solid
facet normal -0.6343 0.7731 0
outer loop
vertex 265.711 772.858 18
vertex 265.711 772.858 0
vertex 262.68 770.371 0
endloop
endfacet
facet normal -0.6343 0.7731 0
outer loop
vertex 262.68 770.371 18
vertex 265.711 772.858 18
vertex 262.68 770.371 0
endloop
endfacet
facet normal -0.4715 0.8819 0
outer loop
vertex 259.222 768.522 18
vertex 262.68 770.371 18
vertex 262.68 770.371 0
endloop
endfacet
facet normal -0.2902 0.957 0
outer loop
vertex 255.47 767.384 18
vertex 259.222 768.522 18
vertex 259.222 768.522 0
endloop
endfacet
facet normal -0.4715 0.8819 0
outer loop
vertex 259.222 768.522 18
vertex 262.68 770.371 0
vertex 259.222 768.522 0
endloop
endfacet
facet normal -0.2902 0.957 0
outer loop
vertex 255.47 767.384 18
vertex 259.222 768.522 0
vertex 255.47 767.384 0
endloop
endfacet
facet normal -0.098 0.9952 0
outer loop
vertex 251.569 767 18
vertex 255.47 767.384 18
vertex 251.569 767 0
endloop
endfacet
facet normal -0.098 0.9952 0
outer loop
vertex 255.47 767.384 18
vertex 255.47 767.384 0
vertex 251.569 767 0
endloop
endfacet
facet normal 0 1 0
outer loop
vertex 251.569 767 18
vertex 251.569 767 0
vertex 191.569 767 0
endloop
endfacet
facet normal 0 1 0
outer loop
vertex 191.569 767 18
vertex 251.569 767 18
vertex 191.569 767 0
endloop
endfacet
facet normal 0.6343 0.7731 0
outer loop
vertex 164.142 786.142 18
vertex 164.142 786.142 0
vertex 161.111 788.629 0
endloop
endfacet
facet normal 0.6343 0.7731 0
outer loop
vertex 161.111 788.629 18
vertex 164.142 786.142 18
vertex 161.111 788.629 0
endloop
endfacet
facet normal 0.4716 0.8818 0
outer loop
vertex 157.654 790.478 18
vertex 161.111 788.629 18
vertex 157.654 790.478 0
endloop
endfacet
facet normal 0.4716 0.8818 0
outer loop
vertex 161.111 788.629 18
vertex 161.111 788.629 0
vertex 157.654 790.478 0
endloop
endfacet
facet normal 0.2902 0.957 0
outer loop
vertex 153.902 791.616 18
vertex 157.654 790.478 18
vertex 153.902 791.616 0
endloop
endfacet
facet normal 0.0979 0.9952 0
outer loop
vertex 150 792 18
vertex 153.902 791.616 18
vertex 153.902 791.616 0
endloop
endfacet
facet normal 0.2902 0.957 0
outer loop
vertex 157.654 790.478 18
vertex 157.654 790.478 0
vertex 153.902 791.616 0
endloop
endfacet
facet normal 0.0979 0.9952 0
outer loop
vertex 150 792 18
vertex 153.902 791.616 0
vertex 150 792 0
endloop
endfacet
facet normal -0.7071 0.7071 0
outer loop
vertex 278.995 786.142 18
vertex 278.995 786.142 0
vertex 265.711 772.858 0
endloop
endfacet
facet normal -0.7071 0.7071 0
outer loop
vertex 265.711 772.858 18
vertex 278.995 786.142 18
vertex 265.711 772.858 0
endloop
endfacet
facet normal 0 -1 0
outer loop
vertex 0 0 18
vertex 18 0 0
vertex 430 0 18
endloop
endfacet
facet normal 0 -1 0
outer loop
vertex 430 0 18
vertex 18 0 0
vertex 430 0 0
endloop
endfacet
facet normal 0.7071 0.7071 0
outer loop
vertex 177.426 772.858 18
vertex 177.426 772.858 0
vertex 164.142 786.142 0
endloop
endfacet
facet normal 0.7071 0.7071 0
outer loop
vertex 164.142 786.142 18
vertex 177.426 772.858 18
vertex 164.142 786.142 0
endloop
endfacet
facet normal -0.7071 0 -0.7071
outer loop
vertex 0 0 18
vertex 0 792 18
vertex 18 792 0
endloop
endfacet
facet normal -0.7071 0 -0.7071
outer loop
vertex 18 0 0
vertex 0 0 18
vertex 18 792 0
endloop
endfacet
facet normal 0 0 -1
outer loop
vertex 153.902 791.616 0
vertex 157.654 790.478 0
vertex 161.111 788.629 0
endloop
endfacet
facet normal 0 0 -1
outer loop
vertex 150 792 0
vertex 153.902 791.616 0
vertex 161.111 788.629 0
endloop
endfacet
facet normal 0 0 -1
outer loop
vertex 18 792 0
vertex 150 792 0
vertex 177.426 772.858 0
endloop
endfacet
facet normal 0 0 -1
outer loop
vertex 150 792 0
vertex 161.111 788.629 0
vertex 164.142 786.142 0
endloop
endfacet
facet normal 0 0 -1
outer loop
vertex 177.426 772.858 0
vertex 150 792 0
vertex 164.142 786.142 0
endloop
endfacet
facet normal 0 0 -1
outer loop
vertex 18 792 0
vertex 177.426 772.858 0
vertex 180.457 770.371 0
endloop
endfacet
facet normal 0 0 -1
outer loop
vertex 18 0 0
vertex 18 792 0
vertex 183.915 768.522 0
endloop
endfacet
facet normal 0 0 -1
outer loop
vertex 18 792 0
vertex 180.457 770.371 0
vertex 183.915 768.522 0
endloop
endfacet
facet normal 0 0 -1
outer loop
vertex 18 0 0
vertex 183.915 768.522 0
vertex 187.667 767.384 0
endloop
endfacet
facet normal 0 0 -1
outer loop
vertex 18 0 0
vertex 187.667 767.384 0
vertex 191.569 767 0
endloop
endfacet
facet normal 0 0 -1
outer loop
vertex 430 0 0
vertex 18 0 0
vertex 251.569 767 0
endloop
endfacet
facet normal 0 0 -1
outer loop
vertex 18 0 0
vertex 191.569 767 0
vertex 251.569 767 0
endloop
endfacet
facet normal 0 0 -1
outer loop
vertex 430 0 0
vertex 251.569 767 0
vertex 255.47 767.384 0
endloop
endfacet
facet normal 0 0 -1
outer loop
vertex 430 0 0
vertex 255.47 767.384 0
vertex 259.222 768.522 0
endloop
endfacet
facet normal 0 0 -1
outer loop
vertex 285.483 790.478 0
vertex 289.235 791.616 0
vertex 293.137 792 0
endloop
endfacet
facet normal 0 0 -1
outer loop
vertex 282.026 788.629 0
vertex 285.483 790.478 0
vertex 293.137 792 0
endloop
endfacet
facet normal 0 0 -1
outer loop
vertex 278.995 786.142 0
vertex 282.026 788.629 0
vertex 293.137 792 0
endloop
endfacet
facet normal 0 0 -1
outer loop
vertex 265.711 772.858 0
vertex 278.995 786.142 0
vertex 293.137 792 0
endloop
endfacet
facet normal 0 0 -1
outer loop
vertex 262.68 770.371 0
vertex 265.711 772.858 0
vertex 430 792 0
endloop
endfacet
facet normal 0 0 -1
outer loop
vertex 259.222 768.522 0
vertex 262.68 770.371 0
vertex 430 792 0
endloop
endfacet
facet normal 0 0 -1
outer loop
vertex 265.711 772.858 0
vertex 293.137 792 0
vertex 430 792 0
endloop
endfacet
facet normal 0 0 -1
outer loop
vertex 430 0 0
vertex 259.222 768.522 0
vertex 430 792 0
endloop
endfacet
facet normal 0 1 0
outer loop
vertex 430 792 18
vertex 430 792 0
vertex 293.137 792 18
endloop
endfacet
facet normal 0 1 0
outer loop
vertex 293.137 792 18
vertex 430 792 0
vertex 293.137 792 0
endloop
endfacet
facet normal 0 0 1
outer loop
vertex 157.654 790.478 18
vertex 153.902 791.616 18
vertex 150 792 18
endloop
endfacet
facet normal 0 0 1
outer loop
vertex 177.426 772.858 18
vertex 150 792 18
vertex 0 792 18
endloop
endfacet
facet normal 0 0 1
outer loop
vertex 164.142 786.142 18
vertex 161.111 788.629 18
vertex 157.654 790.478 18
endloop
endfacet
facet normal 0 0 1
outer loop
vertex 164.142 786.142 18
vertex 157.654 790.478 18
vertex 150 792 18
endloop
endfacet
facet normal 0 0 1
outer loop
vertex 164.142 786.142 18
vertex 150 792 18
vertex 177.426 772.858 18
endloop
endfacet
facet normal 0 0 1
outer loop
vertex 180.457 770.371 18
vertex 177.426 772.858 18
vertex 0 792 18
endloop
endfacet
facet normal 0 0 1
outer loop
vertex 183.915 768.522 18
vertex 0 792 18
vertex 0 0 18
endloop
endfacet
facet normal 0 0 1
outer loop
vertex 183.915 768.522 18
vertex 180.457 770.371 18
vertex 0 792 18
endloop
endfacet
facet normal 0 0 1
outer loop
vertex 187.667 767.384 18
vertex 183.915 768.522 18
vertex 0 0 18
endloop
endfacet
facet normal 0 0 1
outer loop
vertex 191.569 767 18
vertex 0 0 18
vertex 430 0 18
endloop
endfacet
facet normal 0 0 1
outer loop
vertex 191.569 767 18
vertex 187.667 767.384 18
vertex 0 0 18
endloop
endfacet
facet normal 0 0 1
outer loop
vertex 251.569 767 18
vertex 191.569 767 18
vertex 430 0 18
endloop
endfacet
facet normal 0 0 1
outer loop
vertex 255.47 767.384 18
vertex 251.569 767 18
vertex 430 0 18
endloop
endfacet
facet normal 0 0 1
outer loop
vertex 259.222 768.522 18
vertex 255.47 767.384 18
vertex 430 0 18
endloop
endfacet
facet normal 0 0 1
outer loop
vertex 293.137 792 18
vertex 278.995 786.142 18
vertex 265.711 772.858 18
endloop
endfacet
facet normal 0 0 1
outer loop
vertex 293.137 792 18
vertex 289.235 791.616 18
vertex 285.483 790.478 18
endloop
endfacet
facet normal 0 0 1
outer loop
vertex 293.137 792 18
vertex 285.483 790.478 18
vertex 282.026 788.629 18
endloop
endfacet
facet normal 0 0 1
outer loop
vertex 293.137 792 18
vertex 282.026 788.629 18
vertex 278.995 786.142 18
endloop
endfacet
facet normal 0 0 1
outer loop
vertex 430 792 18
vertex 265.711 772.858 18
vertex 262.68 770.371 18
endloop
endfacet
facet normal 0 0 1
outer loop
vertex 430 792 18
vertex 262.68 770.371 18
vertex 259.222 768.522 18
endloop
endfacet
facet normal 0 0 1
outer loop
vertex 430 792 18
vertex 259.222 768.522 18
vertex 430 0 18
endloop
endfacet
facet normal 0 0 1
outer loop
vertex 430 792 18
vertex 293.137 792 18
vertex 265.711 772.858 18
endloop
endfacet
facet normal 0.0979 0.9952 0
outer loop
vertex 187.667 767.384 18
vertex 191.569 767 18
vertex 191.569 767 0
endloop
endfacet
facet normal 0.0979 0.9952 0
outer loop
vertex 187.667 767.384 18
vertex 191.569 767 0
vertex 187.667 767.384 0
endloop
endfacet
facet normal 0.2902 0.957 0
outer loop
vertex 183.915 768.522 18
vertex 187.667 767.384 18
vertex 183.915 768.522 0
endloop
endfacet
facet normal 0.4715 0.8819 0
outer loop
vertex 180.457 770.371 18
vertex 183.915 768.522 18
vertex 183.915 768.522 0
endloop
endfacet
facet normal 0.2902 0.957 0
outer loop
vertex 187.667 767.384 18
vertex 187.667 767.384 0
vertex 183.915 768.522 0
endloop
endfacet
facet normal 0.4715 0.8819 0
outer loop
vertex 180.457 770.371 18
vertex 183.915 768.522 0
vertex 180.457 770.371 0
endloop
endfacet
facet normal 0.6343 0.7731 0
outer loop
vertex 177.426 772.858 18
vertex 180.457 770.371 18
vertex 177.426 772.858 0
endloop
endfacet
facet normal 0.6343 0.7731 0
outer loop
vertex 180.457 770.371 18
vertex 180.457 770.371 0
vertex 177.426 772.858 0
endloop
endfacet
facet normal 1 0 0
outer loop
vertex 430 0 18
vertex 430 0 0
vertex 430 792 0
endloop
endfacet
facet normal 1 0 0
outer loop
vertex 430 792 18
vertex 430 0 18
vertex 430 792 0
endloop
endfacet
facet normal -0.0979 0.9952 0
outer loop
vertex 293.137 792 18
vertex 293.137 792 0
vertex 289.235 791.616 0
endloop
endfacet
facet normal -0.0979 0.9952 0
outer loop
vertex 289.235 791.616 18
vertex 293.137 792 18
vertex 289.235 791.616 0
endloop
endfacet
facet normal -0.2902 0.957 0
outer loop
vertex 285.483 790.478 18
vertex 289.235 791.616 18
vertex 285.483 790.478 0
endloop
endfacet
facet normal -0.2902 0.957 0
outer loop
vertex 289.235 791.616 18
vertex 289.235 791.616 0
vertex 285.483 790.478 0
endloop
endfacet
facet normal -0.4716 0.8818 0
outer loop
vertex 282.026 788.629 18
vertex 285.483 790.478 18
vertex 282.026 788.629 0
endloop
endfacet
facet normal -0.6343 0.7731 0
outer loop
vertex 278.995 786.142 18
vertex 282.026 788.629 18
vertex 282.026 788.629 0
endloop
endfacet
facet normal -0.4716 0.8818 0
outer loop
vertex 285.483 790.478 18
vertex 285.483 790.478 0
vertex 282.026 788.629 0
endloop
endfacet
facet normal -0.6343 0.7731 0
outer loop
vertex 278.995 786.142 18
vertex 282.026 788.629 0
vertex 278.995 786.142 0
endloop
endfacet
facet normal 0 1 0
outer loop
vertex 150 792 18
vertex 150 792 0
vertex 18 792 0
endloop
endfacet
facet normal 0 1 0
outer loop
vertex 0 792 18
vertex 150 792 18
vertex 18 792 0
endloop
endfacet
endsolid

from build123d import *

# Parameters (mm, degrees)
BOSS_EXTRUDE1_DEPTH = 18
CHAMFER1_START      = -1
CHAMFER1_OUTLINE_W  = 28
CHAMFER1_OUTLINE_H  = 793
CHAMFER1_DEPTH      = 13.727922061


with BuildPart() as part:
    # Sketch1 → Boss-Extrude1 (new body)
    with BuildSketch(Plane.XY):
        with BuildLine():
            Line((278.994949366, 786.142135624), (265.710678119, 772.857864376))
            ThreePointArc((265.710678119, 772.857864376), (259.222211142, 768.52240935), (251.568542495, 767))
            Line((251.568542495, 767), (191.568542495, 767))
            ThreePointArc((191.568542495, 767), (183.914873848, 768.52240935), (177.426406871, 772.857864376))
            Line((177.426406871, 772.857864376), (164.142135624, 786.142135624))
            ThreePointArc((164.142135624, 786.142135624), (157.653668647, 790.47759065), (150, 792))
            Line((150, 792), (0, 792))
            Line((0, 792), (0, 0))
            Line((0, 0), (430, 0))
            Line((430, 0), (430, 792))
            Line((430, 792), (293.13708499, 792))
            ThreePointArc((293.13708499, 792), (285.483416343, 790.47759065), (278.994949366, 786.142135624))
        make_face()
    extrude(amount=BOSS_EXTRUDE1_DEPTH)

    # Chamfer1: read off the stored shape, not the designer's step
    # Chamfer1 outline → Chamfer1 (cut)
    with BuildSketch(Plane(origin=(0, 0, 0), x_dir=(0.7071067811865471, 0, -0.707106781186548), z_dir=(0.707106781186548, 0, 0.707106781186547)).offset(CHAMFER1_START)):
        with Locations((0, 395.5)):
            Rectangle(CHAMFER1_OUTLINE_W, CHAMFER1_OUTLINE_H)
    extrude(amount=CHAMFER1_DEPTH, mode=Mode.SUBTRACT)


solid = part.part
